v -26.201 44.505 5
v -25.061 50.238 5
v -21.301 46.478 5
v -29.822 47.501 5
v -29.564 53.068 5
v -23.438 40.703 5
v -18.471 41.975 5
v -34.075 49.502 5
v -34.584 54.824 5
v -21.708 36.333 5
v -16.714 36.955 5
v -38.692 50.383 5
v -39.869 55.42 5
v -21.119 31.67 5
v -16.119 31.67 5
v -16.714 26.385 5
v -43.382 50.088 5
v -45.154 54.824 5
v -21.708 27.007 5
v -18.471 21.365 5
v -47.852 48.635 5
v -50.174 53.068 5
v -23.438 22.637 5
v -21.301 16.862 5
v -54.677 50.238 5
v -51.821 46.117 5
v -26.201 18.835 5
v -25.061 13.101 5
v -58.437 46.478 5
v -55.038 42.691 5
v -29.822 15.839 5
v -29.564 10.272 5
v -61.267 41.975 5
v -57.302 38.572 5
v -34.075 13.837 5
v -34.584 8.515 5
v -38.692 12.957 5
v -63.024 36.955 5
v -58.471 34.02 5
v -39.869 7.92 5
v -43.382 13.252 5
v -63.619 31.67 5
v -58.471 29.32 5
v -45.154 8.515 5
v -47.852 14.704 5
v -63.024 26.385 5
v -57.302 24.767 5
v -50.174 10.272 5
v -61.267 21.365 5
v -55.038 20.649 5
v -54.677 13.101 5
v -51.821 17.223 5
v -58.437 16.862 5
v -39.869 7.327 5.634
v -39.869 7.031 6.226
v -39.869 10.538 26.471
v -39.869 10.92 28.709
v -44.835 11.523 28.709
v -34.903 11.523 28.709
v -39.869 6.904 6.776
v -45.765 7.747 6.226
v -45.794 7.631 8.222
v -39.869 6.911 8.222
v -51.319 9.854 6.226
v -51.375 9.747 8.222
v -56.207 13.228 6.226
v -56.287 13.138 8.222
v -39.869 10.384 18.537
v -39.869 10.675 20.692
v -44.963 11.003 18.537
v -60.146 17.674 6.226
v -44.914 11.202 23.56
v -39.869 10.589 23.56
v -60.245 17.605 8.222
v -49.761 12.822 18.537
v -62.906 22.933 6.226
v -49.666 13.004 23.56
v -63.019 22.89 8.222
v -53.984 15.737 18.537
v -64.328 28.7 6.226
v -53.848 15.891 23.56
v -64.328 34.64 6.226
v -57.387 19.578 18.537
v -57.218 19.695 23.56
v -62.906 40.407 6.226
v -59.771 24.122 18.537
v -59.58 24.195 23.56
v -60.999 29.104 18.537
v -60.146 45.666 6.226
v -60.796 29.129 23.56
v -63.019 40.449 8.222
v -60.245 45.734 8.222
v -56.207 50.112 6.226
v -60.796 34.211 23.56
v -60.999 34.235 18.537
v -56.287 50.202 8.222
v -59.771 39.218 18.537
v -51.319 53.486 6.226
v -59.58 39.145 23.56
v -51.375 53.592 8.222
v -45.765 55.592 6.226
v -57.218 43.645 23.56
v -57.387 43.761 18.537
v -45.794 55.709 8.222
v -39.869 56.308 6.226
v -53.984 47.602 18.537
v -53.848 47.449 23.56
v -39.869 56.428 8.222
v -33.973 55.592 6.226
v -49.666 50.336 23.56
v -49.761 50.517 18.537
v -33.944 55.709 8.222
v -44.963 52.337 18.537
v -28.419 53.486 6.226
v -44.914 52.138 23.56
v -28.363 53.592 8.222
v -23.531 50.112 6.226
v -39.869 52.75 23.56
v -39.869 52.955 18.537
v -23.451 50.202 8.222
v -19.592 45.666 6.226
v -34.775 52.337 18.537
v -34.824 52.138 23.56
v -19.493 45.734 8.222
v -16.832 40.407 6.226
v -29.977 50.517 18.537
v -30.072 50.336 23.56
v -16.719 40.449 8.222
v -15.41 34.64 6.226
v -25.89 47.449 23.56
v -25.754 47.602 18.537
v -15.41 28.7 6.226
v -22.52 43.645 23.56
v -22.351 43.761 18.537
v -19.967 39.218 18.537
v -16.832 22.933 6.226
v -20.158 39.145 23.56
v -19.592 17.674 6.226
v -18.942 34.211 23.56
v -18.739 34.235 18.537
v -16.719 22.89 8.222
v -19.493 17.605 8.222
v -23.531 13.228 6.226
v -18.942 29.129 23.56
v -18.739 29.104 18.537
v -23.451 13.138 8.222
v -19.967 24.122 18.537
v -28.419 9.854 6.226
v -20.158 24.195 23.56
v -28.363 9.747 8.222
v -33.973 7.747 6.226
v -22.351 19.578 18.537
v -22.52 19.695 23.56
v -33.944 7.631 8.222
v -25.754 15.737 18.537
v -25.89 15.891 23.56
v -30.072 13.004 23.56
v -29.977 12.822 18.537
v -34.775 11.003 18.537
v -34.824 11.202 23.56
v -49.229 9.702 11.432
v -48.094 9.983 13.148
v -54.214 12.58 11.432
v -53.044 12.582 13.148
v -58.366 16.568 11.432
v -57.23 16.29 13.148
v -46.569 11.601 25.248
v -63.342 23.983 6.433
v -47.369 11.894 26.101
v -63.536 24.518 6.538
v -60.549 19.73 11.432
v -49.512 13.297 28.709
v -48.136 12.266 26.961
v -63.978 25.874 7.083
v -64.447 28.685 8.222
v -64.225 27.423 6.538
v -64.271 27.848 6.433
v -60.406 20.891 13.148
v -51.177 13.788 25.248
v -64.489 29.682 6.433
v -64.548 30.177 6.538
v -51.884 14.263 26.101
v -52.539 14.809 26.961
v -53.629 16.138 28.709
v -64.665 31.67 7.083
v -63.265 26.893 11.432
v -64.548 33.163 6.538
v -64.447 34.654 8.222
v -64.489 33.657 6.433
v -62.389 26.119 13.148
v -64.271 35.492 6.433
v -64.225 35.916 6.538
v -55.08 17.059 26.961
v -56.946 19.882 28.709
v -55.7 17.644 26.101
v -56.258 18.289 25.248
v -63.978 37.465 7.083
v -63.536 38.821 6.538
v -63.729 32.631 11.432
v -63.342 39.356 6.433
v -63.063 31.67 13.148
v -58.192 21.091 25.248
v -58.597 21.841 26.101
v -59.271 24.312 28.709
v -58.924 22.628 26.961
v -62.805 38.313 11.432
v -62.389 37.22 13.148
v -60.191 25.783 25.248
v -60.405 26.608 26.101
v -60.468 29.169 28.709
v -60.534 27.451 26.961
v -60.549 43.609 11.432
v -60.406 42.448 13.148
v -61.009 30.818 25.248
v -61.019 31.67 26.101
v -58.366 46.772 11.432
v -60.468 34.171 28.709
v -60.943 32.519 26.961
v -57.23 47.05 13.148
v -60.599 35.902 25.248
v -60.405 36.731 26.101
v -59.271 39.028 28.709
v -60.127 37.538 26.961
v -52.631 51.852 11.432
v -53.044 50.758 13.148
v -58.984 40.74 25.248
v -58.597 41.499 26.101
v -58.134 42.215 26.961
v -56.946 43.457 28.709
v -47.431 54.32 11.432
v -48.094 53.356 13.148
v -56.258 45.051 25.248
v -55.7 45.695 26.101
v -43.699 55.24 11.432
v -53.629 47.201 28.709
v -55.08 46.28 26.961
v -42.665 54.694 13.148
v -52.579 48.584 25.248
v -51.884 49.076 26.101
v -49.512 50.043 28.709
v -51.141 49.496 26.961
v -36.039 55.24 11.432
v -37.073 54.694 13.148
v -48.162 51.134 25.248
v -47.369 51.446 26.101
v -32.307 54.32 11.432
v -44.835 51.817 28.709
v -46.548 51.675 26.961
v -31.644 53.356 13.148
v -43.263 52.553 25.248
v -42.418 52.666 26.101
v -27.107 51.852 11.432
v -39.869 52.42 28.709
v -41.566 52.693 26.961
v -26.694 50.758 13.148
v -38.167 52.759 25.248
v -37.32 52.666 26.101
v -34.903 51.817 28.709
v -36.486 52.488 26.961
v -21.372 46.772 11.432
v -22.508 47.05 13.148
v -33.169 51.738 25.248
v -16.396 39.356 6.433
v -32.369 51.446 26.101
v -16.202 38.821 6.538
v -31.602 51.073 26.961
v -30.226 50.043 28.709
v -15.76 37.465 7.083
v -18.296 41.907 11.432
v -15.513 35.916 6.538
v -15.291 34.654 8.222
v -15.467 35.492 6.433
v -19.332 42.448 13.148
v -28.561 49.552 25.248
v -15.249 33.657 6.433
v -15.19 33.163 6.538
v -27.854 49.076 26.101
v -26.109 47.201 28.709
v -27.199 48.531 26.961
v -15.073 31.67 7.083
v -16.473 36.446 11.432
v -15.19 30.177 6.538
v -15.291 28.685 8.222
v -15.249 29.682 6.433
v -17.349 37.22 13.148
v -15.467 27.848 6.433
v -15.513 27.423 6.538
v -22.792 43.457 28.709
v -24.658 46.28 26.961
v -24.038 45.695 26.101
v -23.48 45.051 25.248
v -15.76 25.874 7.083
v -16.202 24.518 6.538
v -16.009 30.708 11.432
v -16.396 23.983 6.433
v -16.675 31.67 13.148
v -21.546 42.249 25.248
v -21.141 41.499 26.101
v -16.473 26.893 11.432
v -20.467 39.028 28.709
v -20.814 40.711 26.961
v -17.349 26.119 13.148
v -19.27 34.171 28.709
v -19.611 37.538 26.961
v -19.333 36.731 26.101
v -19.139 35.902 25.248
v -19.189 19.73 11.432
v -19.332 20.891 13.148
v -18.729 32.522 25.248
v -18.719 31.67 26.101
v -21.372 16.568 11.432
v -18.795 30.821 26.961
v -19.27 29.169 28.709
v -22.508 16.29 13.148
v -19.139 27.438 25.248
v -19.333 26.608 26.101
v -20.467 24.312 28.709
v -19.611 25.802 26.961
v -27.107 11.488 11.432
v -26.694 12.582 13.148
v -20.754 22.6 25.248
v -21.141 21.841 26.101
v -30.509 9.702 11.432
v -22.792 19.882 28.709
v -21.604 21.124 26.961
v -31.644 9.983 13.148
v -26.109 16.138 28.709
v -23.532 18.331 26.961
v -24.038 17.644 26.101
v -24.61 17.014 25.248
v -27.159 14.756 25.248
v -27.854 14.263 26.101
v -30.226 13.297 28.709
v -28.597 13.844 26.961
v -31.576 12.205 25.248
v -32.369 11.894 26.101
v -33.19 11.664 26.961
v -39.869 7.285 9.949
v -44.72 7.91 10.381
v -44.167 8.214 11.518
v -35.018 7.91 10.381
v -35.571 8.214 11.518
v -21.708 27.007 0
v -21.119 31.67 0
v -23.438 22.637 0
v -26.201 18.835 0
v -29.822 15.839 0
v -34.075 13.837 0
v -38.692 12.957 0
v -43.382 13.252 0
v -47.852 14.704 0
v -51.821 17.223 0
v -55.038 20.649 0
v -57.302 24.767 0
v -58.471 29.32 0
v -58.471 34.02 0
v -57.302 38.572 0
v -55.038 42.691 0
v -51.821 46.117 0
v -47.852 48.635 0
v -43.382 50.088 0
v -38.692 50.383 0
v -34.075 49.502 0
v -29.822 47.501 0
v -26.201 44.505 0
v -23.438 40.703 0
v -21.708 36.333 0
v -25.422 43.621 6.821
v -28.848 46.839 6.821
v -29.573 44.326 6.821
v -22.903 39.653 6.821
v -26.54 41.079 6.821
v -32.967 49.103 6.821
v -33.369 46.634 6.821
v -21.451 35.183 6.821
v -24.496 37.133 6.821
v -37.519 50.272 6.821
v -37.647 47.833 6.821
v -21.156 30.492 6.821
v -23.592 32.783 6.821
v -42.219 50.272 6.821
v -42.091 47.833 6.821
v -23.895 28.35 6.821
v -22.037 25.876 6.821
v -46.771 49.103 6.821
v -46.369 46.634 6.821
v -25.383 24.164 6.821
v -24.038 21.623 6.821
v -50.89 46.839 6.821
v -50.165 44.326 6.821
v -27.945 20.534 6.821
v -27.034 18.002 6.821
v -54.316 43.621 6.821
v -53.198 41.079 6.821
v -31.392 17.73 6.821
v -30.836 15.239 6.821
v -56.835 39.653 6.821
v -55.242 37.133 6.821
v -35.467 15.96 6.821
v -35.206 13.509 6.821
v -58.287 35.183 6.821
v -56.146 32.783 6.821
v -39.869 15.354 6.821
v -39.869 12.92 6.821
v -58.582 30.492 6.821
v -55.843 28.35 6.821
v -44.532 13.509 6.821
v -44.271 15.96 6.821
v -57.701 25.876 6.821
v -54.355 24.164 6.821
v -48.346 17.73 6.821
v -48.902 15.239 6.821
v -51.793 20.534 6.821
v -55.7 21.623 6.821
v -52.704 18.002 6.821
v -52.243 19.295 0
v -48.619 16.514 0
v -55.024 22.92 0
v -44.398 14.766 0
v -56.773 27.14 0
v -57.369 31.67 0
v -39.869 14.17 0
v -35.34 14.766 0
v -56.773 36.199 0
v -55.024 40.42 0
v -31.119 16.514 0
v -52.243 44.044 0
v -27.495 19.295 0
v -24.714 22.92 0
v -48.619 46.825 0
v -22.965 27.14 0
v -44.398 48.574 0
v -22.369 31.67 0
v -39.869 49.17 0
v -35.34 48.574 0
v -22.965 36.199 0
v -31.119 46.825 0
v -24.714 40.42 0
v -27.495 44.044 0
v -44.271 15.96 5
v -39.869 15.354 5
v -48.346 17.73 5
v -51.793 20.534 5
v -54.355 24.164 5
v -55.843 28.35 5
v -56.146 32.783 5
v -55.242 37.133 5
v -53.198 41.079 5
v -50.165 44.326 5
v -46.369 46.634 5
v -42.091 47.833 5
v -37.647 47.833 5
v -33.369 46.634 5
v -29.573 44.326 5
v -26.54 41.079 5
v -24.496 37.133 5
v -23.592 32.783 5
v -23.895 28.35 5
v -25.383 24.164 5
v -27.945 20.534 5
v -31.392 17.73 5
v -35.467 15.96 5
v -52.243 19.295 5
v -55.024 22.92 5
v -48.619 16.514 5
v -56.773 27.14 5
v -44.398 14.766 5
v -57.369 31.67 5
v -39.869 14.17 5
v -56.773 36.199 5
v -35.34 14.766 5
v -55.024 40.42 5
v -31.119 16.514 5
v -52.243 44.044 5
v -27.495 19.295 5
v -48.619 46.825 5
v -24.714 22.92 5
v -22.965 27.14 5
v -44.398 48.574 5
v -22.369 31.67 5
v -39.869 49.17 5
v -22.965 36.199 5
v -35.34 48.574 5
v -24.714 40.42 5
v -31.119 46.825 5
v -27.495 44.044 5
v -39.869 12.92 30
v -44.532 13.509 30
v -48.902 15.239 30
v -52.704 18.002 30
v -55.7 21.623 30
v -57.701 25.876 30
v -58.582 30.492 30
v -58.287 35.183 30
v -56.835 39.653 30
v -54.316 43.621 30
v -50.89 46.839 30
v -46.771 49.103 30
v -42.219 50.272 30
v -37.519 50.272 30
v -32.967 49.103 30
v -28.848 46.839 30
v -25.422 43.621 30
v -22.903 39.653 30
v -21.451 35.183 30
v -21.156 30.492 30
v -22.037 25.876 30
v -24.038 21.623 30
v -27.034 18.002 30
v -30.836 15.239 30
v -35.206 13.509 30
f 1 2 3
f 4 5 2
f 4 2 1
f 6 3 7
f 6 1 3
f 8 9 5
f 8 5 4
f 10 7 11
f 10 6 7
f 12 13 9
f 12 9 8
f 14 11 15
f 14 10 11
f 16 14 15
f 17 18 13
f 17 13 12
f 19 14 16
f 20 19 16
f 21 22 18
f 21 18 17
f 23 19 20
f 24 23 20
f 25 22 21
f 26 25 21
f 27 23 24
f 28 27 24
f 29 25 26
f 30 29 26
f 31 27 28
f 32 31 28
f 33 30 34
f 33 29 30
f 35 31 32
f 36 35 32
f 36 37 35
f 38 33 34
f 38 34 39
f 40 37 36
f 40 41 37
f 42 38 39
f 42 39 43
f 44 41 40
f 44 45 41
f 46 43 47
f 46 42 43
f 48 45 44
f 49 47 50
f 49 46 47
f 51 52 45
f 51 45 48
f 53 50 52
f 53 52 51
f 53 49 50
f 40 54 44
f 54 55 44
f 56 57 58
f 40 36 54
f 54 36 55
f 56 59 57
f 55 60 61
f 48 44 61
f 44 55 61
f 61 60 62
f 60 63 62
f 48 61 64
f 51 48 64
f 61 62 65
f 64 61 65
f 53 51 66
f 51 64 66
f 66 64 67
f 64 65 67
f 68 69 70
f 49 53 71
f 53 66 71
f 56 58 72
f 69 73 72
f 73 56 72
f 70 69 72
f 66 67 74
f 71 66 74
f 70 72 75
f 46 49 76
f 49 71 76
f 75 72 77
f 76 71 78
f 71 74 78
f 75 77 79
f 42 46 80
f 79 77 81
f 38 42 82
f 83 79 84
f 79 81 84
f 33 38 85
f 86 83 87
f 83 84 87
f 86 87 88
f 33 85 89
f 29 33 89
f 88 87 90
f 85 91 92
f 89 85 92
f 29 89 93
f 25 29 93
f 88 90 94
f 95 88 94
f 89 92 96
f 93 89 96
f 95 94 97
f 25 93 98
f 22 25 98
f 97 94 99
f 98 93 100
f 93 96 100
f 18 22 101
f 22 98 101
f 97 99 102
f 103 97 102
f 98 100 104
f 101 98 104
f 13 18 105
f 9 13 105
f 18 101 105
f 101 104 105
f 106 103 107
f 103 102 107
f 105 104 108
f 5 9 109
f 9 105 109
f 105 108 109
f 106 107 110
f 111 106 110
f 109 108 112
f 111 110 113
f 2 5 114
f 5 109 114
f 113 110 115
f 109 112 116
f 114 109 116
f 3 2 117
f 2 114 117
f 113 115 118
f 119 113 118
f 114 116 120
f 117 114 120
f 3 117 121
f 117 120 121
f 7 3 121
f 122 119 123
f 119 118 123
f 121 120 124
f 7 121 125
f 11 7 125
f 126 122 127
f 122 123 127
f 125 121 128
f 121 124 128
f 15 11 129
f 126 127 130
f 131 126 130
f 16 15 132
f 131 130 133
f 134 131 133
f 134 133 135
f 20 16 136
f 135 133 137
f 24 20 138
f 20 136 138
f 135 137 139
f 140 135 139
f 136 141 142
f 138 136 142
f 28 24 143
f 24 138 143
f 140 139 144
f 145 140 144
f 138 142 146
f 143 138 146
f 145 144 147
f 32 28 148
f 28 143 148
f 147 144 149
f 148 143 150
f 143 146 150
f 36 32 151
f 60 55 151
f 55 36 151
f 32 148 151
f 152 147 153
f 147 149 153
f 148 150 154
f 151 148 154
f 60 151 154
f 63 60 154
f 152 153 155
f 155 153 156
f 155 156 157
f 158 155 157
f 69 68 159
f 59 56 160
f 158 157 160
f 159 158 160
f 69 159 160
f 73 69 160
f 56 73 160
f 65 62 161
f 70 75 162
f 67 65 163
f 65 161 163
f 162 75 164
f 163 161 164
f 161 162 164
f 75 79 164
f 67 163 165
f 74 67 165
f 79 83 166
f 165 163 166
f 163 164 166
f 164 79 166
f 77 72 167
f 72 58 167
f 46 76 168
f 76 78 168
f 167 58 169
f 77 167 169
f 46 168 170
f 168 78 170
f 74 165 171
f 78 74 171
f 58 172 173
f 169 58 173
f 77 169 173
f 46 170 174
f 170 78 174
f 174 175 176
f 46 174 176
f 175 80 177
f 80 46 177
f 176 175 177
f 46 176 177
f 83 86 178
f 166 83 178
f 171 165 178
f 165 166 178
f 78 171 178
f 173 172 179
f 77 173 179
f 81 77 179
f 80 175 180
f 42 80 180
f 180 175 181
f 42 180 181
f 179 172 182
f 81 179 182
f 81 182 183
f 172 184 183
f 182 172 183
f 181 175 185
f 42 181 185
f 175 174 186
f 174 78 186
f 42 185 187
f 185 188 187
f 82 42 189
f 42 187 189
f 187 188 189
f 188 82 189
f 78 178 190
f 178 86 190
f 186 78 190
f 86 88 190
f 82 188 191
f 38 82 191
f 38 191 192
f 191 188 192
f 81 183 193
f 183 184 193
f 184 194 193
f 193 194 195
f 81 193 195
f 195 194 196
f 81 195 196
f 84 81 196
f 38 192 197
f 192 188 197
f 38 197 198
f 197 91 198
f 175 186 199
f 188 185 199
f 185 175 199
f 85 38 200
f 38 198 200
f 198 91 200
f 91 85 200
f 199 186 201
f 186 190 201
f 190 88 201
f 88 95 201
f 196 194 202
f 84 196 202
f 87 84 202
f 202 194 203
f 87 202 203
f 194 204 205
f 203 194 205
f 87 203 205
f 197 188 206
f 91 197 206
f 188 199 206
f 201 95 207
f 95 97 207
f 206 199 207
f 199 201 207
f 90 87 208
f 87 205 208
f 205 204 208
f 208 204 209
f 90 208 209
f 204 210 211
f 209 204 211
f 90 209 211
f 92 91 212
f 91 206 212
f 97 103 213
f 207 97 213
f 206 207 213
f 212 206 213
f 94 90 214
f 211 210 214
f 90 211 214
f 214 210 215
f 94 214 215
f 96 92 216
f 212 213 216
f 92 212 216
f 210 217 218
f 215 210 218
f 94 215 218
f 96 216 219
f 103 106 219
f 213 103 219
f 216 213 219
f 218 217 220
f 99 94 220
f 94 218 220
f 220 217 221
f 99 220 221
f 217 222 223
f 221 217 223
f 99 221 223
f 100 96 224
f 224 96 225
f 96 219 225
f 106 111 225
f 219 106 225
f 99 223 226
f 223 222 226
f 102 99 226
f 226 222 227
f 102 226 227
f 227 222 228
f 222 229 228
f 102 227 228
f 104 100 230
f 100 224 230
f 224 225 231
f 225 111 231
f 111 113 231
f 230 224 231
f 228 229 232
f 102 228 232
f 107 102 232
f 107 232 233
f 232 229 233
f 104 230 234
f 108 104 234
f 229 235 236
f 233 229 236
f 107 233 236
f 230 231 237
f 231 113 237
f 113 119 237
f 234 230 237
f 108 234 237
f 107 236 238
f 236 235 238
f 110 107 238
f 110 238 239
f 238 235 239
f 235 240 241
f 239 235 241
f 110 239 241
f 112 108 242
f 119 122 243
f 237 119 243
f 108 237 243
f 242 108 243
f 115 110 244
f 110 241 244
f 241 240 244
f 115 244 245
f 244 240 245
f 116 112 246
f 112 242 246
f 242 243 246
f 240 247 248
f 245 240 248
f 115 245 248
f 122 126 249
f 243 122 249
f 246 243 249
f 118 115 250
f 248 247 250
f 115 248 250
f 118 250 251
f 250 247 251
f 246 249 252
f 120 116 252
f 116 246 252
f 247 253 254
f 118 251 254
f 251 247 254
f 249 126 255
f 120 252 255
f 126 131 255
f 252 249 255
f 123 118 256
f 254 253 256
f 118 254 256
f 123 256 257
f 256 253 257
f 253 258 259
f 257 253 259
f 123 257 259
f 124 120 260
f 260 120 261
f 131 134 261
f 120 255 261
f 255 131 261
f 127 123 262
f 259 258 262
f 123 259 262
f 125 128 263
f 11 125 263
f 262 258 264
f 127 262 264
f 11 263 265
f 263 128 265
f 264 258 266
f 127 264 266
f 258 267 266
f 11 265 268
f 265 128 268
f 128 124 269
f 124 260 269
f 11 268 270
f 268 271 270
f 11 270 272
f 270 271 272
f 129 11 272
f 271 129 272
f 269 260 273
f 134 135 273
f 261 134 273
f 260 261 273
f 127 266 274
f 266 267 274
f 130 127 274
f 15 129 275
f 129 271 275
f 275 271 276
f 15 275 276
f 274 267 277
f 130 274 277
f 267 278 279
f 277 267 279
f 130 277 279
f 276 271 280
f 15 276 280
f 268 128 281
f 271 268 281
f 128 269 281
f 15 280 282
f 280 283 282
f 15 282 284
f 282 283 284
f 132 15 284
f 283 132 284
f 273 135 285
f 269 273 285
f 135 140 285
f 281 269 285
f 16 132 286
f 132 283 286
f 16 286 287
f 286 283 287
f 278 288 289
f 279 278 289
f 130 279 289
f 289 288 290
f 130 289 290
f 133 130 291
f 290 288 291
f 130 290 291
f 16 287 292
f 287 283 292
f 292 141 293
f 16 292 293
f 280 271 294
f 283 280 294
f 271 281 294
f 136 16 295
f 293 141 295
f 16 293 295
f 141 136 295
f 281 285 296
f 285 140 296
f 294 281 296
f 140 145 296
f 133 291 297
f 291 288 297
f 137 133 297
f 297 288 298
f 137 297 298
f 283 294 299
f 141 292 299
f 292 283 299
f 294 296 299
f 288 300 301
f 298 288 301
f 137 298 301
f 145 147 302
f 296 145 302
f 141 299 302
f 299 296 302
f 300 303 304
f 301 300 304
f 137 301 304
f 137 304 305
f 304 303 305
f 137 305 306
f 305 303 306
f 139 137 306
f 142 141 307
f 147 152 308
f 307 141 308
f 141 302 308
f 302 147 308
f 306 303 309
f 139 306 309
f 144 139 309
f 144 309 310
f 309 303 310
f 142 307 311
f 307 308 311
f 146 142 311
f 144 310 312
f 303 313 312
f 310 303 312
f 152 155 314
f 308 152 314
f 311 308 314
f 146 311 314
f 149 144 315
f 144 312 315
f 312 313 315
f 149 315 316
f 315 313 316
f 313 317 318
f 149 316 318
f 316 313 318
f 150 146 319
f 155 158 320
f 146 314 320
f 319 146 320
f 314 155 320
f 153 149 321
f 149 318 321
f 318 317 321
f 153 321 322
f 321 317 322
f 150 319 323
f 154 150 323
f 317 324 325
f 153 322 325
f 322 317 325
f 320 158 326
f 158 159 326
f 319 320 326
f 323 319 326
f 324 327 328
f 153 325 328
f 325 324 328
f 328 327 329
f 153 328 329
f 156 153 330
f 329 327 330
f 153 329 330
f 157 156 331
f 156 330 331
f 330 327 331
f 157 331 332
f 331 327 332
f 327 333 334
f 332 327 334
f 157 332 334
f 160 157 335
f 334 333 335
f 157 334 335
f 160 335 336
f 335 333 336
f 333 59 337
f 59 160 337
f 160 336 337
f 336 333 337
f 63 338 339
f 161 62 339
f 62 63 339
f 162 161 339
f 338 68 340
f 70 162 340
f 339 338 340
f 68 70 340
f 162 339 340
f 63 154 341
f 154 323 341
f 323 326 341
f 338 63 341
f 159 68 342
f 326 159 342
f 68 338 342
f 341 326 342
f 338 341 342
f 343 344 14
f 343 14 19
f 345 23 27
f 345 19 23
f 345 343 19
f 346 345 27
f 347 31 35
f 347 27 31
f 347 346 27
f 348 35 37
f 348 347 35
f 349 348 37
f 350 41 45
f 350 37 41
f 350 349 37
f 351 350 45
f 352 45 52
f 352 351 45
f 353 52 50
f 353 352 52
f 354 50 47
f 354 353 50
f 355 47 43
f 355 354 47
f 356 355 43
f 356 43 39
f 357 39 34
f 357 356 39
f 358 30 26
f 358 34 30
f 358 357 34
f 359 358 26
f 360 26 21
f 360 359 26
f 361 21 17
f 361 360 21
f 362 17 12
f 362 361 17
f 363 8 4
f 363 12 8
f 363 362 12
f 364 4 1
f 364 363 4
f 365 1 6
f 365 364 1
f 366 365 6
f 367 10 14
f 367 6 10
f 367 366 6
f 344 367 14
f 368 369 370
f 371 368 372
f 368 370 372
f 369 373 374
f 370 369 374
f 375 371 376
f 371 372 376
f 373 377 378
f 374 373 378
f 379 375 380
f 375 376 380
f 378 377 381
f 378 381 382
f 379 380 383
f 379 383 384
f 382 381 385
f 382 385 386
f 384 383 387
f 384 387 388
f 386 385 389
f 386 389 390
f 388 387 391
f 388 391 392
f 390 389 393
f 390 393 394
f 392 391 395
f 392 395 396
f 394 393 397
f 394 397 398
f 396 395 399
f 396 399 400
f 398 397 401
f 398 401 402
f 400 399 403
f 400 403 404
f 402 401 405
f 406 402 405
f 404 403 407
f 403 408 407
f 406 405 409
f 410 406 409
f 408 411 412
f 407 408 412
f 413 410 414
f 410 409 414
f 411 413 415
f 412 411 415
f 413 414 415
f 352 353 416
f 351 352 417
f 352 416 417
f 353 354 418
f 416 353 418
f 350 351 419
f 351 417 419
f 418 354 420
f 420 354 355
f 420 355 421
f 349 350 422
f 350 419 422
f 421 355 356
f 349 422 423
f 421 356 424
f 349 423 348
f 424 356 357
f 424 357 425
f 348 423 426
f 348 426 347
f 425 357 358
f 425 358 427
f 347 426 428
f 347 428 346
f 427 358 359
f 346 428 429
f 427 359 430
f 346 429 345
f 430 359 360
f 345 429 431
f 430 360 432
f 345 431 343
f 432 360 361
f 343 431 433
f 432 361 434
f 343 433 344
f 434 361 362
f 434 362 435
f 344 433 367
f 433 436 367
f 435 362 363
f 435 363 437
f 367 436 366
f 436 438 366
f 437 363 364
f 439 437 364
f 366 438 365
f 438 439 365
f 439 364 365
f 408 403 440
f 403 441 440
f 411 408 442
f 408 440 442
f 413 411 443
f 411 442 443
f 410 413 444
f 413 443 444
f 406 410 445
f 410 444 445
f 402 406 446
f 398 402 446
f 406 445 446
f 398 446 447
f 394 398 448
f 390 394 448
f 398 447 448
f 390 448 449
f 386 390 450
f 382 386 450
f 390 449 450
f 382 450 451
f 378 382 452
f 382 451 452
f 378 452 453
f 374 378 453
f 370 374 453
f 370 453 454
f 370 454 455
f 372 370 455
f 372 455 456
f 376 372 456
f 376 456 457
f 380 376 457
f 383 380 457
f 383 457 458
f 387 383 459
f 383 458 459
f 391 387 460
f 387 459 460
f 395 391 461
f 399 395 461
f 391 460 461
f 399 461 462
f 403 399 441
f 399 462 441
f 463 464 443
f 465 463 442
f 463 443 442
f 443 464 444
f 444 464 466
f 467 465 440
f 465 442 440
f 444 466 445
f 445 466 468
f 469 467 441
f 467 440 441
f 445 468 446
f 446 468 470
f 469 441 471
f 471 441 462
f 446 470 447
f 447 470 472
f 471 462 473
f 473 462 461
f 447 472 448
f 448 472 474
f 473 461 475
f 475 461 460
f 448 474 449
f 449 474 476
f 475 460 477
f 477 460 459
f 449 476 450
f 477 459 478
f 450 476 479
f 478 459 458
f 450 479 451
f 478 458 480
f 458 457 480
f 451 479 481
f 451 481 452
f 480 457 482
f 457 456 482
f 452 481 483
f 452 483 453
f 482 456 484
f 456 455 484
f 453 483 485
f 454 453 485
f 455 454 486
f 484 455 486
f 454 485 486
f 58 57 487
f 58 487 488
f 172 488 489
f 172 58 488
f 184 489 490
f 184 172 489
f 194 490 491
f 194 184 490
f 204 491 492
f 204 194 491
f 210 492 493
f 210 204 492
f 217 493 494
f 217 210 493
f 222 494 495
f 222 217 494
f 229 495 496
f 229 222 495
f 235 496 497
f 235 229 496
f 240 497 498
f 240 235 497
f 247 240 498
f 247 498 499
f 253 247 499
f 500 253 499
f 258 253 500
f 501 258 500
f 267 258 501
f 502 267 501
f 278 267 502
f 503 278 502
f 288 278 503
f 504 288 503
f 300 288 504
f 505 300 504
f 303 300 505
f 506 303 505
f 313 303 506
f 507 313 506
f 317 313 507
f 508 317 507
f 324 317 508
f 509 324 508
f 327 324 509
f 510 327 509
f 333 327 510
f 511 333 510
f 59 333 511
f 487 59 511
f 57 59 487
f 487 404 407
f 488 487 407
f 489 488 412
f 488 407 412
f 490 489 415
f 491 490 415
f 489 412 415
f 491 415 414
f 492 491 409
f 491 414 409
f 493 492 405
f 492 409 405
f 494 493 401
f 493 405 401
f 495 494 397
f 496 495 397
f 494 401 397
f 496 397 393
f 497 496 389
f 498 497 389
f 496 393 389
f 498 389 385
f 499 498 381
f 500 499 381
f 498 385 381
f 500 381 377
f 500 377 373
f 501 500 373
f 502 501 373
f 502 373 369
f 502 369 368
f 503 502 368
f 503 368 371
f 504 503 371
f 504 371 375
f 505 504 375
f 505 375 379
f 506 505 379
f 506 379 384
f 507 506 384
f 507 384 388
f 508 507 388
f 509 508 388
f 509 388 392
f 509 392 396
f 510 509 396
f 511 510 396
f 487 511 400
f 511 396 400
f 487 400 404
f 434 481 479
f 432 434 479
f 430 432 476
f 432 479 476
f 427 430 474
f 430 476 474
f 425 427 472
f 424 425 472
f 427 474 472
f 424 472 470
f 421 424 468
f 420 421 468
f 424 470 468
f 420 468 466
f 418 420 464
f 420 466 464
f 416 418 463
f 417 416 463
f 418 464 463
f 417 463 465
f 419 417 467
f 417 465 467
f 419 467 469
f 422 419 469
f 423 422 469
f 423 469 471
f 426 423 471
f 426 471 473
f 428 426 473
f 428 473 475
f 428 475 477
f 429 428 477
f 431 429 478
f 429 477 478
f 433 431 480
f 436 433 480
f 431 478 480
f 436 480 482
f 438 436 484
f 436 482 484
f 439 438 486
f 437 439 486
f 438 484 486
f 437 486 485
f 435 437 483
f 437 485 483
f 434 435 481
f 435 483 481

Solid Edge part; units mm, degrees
sketch "Sketch1" plane through (0, 0, 0) normal (0, 0, 1) x (1, 0, 0)
  circle A0 centre (-39.869, 31.6698) radius 18.75
extrude "Protrusion1" add sketch "Sketch1" along normal blind 5
sketch "Sketch2" plane through (-39.869, 0, 0) normal (1, 0, 0) x (0, 1, 0)
  line L0 (7.9198, 5) -> (15.3545, 5)
  line L1 (15.3545, 6.8212) -> (15.3545, 5)
  line L2 (12.9198, 6.8212) -> (15.3545, 6.8212)
  line L3 (12.9198, 30) -> (12.9198, 6.8212)
  line L4 (10.9198, 28.7087) -> (12.9198, 30)
  spline S0 degree 3 poles (7.9198, 5) (7.1334, 5.644) (5.9062, 9.7242) (12.3538, 18.3074) (10.0252, 25.68) (10.9198, 28.7087) knots 0 0 0 0 0.110294 0.658666 1 1 1 1
revolve "RevolvedProtrusion1" add sketch "Sketch2" angle 360 about axis through (-39.869, 31.6698, 36.8488) along (0, 0, -1)
sketch "Sketch3" plane through (-39.869, 31.6698, 5) normal (0, 0, 1) x (0, 1, 0)
  circle A0 centre (0, 0) radius 17.5
extrude "ExtrudedCutout_2" cut sketch "Sketch3" against normal blind 136.525
